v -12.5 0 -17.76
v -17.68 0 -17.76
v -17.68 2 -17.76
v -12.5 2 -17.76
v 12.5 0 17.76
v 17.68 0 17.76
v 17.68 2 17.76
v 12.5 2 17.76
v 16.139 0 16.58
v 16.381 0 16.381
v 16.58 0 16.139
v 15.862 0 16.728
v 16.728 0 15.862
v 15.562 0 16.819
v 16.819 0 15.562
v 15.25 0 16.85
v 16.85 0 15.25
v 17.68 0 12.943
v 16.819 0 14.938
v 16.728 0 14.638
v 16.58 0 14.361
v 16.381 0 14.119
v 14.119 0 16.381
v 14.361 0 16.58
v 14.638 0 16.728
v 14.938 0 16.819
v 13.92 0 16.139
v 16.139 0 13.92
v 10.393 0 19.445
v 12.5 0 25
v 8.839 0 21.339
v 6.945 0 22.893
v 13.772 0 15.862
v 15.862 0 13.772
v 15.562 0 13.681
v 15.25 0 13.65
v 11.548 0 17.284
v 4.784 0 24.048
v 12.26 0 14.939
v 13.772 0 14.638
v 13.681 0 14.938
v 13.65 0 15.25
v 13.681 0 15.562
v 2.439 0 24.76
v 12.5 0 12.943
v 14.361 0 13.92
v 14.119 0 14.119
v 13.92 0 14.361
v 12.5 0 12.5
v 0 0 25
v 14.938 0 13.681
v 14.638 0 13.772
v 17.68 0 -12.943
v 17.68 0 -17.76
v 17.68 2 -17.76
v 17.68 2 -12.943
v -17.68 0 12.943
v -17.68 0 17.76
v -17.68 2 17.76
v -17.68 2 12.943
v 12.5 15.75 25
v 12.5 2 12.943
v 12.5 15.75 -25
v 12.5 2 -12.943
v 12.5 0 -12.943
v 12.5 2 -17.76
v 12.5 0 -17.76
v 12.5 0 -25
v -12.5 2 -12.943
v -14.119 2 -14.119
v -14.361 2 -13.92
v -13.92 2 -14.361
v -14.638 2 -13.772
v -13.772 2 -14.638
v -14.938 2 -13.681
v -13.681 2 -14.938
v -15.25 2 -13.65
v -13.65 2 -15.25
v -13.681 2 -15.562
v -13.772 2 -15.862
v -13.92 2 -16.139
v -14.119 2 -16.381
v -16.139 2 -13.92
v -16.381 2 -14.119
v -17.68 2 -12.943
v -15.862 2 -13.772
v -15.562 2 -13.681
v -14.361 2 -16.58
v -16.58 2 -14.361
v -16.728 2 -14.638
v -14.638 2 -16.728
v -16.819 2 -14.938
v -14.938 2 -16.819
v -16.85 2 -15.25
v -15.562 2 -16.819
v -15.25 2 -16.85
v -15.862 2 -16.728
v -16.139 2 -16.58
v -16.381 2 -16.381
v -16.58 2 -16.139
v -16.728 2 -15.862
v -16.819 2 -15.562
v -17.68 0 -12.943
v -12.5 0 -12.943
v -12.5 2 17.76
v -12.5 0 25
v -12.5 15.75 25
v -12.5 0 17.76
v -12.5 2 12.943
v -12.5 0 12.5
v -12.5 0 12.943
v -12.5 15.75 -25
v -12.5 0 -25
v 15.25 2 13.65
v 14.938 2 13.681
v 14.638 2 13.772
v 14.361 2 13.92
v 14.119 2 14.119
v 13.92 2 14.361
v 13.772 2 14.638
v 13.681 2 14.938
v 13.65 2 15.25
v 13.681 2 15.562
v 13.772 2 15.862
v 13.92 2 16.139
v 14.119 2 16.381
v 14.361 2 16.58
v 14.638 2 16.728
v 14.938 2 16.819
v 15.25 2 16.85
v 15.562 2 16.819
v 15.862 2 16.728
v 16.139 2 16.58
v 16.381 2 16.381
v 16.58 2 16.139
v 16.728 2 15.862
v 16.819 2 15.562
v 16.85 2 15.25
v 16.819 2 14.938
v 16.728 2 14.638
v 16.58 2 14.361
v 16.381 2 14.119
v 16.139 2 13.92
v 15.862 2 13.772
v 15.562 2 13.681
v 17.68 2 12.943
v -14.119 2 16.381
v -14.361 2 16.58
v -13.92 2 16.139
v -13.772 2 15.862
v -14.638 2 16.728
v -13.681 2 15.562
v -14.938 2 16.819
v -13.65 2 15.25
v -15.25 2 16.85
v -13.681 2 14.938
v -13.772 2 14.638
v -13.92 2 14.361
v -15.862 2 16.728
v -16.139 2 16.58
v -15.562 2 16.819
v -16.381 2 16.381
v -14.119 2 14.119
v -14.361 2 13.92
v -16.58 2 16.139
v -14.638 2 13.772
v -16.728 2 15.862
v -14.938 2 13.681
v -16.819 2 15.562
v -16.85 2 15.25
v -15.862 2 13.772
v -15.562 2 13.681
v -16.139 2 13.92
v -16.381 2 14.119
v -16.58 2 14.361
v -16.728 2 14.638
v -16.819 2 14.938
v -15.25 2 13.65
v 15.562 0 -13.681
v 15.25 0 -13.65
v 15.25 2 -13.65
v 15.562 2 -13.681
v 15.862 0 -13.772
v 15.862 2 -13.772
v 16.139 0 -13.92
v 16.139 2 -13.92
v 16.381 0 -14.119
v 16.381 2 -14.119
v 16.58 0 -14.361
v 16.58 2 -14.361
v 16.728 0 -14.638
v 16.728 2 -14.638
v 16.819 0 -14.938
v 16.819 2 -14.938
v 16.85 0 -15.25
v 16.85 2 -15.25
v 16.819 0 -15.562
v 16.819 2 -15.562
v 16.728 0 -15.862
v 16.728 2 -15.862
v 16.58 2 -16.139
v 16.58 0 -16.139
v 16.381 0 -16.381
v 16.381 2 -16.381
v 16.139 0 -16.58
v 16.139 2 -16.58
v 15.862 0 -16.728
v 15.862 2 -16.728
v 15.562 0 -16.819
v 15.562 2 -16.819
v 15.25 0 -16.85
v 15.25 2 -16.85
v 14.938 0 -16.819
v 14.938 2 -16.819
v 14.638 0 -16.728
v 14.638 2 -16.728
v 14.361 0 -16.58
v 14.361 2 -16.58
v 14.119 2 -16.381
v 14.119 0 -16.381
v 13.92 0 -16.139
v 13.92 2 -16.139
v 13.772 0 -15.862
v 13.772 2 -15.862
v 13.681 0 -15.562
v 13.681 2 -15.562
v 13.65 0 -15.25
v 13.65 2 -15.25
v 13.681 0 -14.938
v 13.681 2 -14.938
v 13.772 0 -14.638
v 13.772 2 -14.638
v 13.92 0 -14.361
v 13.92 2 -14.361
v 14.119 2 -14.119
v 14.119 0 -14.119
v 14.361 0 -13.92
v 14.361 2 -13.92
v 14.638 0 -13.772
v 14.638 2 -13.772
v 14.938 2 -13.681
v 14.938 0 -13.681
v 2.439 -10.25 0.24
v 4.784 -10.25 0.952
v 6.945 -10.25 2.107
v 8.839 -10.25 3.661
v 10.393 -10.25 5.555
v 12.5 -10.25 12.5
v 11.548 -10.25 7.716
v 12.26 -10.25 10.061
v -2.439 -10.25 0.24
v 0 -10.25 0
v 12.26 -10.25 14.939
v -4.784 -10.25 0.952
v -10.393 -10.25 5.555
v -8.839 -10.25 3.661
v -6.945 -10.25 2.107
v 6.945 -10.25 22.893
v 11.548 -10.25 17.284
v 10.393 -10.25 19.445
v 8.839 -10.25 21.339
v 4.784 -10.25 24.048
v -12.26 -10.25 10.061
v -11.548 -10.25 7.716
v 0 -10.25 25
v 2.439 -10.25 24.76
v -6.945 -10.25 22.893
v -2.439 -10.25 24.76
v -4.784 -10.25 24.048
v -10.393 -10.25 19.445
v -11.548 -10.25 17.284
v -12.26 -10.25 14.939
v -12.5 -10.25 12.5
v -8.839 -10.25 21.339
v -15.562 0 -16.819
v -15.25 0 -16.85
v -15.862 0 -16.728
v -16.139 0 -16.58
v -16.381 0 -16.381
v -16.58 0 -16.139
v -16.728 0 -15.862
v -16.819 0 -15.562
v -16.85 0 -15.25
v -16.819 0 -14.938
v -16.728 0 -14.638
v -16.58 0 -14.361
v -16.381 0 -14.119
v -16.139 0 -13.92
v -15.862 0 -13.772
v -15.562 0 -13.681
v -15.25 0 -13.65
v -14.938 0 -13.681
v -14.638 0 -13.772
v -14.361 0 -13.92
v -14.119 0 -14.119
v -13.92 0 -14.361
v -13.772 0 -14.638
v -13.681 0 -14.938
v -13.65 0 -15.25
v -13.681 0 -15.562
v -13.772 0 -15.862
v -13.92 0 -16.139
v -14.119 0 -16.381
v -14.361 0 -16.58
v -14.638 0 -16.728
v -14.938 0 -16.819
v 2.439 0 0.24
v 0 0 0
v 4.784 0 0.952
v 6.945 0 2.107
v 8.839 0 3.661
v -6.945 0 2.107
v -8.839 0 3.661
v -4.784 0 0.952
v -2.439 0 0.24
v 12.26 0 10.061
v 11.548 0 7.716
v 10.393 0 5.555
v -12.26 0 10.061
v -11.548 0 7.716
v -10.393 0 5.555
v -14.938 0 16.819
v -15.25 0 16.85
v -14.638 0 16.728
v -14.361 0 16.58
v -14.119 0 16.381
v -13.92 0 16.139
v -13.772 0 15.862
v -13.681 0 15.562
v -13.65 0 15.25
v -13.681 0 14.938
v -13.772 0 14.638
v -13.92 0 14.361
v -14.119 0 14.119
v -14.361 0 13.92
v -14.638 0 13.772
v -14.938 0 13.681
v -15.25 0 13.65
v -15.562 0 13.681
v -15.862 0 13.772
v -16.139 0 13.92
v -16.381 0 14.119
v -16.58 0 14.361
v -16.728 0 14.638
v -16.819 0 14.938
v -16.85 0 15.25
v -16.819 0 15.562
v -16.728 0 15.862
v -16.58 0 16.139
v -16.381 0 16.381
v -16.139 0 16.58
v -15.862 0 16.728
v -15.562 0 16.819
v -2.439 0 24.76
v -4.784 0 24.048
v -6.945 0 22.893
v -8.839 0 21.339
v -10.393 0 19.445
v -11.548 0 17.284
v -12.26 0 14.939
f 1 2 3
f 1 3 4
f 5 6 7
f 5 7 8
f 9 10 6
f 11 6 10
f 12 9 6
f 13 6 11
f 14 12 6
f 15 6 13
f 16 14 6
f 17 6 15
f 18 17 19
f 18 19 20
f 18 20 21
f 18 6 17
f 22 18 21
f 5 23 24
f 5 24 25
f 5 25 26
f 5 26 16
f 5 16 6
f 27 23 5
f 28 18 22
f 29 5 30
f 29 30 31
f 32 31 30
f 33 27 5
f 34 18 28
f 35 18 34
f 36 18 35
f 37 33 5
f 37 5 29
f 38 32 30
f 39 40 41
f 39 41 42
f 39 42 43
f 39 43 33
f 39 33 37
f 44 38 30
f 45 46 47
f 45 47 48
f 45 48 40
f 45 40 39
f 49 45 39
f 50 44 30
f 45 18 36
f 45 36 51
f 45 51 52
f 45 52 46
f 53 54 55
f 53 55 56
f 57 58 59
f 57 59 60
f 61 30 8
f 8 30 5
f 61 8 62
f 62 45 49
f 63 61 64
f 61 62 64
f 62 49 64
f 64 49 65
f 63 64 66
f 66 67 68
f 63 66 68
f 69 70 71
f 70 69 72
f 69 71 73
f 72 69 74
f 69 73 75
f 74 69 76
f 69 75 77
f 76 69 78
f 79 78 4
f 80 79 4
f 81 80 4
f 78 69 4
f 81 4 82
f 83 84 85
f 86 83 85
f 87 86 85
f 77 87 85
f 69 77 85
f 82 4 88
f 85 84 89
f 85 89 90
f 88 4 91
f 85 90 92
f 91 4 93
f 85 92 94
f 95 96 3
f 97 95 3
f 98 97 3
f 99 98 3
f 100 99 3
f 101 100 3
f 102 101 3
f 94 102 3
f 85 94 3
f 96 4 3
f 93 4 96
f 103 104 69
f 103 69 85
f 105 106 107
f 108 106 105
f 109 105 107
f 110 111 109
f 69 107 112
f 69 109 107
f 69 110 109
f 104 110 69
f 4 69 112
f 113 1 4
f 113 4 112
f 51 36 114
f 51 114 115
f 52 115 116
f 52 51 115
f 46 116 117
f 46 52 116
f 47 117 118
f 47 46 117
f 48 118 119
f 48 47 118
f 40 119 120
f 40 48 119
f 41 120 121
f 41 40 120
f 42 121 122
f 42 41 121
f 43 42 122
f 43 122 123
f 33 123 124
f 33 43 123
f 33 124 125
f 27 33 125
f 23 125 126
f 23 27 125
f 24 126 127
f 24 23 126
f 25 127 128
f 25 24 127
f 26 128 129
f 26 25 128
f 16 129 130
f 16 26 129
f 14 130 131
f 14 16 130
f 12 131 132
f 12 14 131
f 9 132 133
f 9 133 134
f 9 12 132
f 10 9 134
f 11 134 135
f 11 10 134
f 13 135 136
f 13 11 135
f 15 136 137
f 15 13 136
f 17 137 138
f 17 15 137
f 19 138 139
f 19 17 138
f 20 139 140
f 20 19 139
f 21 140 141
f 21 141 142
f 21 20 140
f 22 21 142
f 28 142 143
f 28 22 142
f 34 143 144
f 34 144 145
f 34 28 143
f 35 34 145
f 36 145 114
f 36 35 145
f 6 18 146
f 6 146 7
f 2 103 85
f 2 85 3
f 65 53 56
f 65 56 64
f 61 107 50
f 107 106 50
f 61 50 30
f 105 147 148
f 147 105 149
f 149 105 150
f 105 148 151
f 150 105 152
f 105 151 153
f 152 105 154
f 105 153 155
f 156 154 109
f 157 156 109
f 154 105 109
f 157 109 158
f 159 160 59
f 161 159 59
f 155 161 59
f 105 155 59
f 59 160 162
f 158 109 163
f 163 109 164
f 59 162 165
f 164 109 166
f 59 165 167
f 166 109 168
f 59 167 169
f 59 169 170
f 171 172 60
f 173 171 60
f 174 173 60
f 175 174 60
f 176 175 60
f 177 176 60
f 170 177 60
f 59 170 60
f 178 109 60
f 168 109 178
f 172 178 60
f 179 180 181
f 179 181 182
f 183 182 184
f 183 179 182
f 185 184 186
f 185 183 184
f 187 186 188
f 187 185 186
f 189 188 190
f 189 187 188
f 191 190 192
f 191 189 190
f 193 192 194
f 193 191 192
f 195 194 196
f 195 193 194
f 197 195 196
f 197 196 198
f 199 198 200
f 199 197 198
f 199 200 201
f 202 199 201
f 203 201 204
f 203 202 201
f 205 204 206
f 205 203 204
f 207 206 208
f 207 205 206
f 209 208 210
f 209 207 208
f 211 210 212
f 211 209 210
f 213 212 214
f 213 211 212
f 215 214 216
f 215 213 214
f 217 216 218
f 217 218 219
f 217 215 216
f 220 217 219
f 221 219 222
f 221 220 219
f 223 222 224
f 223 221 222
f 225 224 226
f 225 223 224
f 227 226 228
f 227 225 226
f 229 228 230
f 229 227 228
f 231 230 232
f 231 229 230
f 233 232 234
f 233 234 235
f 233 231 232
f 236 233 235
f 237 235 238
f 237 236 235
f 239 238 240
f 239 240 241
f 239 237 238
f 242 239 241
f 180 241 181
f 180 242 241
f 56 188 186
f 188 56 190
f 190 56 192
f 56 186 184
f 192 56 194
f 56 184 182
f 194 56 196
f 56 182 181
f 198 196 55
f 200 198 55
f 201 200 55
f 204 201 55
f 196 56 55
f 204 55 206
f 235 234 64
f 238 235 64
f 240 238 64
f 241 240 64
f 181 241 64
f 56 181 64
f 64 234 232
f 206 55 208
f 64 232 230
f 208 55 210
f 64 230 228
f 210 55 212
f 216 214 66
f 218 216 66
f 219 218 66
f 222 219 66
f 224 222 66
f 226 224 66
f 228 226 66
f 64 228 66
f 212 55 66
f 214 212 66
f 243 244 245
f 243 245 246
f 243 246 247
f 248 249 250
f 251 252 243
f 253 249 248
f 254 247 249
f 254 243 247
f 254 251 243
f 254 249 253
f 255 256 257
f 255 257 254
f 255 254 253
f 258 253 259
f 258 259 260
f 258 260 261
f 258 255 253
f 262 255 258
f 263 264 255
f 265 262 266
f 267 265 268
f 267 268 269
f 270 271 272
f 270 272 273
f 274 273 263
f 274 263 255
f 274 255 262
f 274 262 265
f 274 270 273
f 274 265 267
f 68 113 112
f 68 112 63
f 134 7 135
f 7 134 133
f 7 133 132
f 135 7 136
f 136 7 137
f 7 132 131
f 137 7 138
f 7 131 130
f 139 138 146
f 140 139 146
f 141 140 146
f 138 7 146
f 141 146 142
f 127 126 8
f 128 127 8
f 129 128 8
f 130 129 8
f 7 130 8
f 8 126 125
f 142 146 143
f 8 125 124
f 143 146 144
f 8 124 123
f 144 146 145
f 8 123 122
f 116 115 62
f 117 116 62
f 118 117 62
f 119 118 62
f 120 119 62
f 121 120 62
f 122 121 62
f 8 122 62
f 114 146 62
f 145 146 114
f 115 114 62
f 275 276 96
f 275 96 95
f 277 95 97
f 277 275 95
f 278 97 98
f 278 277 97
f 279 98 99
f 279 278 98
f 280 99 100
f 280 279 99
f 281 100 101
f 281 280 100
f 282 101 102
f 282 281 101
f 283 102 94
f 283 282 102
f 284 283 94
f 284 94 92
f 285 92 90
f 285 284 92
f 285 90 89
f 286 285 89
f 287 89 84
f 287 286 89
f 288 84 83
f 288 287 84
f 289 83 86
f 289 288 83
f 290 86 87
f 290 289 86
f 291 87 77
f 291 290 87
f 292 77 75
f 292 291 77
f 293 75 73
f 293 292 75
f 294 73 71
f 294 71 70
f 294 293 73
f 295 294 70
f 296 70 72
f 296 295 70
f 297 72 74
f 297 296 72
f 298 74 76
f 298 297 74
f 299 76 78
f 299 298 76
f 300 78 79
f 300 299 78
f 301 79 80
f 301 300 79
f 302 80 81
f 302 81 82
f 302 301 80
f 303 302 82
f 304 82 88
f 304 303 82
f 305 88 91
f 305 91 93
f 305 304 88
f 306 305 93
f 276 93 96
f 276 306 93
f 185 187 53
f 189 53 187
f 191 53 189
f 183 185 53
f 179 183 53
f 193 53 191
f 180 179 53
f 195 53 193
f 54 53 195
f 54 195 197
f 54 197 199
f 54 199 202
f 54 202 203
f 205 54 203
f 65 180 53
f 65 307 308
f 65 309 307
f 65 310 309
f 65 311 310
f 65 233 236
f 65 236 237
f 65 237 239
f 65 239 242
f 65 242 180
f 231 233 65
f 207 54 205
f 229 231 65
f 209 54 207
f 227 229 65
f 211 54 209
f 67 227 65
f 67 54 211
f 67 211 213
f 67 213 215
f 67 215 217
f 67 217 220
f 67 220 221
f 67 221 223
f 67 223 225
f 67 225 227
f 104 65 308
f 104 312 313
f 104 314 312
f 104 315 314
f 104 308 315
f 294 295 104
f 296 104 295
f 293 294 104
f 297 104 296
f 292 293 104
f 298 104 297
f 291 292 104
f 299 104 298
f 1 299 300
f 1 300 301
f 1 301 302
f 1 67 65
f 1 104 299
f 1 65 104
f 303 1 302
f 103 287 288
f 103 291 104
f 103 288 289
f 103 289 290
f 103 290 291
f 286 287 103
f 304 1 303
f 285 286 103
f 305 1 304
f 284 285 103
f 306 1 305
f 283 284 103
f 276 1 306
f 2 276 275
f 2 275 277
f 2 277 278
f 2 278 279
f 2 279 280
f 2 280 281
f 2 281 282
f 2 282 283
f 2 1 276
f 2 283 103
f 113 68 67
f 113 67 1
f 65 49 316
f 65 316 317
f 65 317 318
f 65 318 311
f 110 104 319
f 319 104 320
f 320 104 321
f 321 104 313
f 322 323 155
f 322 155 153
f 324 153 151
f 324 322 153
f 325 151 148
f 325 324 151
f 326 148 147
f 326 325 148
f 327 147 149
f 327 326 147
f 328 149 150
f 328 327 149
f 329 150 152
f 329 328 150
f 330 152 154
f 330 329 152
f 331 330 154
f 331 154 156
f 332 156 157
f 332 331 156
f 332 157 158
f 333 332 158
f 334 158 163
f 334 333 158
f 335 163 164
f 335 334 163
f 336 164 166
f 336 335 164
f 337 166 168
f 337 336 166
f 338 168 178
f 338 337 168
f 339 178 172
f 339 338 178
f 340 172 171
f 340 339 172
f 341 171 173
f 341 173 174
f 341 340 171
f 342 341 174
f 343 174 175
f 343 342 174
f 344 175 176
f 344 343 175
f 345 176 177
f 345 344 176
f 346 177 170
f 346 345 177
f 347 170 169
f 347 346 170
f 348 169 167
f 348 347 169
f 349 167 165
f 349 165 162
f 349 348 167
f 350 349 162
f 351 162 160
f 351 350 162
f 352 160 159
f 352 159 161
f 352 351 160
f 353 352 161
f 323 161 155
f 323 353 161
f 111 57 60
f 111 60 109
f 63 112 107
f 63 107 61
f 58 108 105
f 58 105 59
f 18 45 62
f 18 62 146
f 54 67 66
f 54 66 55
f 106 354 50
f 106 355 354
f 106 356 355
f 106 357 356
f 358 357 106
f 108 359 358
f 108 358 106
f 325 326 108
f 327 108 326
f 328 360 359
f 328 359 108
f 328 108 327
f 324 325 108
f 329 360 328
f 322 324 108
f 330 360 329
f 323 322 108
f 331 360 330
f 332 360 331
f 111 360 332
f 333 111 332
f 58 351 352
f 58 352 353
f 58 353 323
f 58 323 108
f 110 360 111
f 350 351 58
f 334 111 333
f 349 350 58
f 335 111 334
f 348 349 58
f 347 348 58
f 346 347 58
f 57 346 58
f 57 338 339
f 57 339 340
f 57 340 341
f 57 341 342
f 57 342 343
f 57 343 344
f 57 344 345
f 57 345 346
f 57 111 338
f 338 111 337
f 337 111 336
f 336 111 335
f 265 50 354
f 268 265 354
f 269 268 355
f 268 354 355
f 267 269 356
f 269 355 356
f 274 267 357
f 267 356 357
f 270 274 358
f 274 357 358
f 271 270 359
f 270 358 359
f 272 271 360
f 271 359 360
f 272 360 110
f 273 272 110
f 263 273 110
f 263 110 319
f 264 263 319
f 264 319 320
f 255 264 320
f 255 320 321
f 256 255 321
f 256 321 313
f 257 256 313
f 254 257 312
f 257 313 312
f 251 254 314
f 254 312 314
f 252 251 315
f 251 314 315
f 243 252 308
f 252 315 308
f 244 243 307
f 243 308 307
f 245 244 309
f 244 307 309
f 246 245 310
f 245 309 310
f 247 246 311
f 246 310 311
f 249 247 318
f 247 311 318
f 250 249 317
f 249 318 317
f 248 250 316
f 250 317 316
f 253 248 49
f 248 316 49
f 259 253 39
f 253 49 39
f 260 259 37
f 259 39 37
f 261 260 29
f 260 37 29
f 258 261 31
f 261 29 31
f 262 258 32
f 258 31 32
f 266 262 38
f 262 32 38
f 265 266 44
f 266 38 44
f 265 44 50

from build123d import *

# Parameters (mm, degrees)
SKETCH_1_R      = 1.6
EXTRUDE_1_DEPTH = 2
SKETCH_2_W      = 25
SKETCH_2_H      = 50
EXTRUDE_2_DEPTH = 13.75
SKETCH_3_R      = 12.5
EXTRUDE_3_DEPTH = 10.25


with BuildPart() as part:
    # 草图1 → 凸台-拉伸1 (new body)
    with BuildSketch(Plane(origin=(0, 0, 0), x_dir=(1, 0, 0), z_dir=(0, 1, 0))):
        Polygon((-12.5, 25), (12.5, 25), (12.5, 17.760130657), (17.680206778, 17.760130657), (17.680206778, 12.943452398), (12.5, 12.943452398), (12.5, -12.943452398), (17.680206778, -12.943452398), (17.680206778, -17.760130657), (12.5, -17.760130657), (12.5, -25), (-12.5, -25), (-12.5, -17.760130657), (-17.680206778, -17.760130657), (-17.680206778, -12.943452398), (-12.5, -12.943452398), (-12.5, 12.943452398), (-17.680206778, 12.943452398), (-17.680206778, 17.760130657), (-12.5, 17.760130657), align=None)
        with Locations(Location((15.25, 15.25, 0), (0, 0, 270))):
            Circle(SKETCH_1_R, mode=Mode.SUBTRACT)
        with Locations(Location((-15.25, 15.25, 0), (0, 0, 90))):
            Circle(SKETCH_1_R, mode=Mode.SUBTRACT)
        with Locations(Location((15.25, -15.25, 0), (0, 0, 90))):
            Circle(SKETCH_1_R, mode=Mode.SUBTRACT)
        with Locations(Location((-15.25, -15.25, 0), (0, 0, 270))):
            Circle(SKETCH_1_R, mode=Mode.SUBTRACT)
    extrude(amount=EXTRUDE_1_DEPTH)

    # 草图2 → 凸台-拉伸2 (add)
    with BuildSketch(Plane(origin=(0, 2, 0), x_dir=(1, 0, 0), z_dir=(0, 1, 0))):
        Rectangle(SKETCH_2_W, SKETCH_2_H)
    extrude(amount=EXTRUDE_2_DEPTH)

    # 草图3 → 凸台-拉伸3 (add)
    with BuildSketch(Plane.XZ):
        with Locations(Location((0, 12.5, 0), (0, 0, 90))):
            Circle(SKETCH_3_R)
    extrude(amount=EXTRUDE_3_DEPTH)


solid = part.part
